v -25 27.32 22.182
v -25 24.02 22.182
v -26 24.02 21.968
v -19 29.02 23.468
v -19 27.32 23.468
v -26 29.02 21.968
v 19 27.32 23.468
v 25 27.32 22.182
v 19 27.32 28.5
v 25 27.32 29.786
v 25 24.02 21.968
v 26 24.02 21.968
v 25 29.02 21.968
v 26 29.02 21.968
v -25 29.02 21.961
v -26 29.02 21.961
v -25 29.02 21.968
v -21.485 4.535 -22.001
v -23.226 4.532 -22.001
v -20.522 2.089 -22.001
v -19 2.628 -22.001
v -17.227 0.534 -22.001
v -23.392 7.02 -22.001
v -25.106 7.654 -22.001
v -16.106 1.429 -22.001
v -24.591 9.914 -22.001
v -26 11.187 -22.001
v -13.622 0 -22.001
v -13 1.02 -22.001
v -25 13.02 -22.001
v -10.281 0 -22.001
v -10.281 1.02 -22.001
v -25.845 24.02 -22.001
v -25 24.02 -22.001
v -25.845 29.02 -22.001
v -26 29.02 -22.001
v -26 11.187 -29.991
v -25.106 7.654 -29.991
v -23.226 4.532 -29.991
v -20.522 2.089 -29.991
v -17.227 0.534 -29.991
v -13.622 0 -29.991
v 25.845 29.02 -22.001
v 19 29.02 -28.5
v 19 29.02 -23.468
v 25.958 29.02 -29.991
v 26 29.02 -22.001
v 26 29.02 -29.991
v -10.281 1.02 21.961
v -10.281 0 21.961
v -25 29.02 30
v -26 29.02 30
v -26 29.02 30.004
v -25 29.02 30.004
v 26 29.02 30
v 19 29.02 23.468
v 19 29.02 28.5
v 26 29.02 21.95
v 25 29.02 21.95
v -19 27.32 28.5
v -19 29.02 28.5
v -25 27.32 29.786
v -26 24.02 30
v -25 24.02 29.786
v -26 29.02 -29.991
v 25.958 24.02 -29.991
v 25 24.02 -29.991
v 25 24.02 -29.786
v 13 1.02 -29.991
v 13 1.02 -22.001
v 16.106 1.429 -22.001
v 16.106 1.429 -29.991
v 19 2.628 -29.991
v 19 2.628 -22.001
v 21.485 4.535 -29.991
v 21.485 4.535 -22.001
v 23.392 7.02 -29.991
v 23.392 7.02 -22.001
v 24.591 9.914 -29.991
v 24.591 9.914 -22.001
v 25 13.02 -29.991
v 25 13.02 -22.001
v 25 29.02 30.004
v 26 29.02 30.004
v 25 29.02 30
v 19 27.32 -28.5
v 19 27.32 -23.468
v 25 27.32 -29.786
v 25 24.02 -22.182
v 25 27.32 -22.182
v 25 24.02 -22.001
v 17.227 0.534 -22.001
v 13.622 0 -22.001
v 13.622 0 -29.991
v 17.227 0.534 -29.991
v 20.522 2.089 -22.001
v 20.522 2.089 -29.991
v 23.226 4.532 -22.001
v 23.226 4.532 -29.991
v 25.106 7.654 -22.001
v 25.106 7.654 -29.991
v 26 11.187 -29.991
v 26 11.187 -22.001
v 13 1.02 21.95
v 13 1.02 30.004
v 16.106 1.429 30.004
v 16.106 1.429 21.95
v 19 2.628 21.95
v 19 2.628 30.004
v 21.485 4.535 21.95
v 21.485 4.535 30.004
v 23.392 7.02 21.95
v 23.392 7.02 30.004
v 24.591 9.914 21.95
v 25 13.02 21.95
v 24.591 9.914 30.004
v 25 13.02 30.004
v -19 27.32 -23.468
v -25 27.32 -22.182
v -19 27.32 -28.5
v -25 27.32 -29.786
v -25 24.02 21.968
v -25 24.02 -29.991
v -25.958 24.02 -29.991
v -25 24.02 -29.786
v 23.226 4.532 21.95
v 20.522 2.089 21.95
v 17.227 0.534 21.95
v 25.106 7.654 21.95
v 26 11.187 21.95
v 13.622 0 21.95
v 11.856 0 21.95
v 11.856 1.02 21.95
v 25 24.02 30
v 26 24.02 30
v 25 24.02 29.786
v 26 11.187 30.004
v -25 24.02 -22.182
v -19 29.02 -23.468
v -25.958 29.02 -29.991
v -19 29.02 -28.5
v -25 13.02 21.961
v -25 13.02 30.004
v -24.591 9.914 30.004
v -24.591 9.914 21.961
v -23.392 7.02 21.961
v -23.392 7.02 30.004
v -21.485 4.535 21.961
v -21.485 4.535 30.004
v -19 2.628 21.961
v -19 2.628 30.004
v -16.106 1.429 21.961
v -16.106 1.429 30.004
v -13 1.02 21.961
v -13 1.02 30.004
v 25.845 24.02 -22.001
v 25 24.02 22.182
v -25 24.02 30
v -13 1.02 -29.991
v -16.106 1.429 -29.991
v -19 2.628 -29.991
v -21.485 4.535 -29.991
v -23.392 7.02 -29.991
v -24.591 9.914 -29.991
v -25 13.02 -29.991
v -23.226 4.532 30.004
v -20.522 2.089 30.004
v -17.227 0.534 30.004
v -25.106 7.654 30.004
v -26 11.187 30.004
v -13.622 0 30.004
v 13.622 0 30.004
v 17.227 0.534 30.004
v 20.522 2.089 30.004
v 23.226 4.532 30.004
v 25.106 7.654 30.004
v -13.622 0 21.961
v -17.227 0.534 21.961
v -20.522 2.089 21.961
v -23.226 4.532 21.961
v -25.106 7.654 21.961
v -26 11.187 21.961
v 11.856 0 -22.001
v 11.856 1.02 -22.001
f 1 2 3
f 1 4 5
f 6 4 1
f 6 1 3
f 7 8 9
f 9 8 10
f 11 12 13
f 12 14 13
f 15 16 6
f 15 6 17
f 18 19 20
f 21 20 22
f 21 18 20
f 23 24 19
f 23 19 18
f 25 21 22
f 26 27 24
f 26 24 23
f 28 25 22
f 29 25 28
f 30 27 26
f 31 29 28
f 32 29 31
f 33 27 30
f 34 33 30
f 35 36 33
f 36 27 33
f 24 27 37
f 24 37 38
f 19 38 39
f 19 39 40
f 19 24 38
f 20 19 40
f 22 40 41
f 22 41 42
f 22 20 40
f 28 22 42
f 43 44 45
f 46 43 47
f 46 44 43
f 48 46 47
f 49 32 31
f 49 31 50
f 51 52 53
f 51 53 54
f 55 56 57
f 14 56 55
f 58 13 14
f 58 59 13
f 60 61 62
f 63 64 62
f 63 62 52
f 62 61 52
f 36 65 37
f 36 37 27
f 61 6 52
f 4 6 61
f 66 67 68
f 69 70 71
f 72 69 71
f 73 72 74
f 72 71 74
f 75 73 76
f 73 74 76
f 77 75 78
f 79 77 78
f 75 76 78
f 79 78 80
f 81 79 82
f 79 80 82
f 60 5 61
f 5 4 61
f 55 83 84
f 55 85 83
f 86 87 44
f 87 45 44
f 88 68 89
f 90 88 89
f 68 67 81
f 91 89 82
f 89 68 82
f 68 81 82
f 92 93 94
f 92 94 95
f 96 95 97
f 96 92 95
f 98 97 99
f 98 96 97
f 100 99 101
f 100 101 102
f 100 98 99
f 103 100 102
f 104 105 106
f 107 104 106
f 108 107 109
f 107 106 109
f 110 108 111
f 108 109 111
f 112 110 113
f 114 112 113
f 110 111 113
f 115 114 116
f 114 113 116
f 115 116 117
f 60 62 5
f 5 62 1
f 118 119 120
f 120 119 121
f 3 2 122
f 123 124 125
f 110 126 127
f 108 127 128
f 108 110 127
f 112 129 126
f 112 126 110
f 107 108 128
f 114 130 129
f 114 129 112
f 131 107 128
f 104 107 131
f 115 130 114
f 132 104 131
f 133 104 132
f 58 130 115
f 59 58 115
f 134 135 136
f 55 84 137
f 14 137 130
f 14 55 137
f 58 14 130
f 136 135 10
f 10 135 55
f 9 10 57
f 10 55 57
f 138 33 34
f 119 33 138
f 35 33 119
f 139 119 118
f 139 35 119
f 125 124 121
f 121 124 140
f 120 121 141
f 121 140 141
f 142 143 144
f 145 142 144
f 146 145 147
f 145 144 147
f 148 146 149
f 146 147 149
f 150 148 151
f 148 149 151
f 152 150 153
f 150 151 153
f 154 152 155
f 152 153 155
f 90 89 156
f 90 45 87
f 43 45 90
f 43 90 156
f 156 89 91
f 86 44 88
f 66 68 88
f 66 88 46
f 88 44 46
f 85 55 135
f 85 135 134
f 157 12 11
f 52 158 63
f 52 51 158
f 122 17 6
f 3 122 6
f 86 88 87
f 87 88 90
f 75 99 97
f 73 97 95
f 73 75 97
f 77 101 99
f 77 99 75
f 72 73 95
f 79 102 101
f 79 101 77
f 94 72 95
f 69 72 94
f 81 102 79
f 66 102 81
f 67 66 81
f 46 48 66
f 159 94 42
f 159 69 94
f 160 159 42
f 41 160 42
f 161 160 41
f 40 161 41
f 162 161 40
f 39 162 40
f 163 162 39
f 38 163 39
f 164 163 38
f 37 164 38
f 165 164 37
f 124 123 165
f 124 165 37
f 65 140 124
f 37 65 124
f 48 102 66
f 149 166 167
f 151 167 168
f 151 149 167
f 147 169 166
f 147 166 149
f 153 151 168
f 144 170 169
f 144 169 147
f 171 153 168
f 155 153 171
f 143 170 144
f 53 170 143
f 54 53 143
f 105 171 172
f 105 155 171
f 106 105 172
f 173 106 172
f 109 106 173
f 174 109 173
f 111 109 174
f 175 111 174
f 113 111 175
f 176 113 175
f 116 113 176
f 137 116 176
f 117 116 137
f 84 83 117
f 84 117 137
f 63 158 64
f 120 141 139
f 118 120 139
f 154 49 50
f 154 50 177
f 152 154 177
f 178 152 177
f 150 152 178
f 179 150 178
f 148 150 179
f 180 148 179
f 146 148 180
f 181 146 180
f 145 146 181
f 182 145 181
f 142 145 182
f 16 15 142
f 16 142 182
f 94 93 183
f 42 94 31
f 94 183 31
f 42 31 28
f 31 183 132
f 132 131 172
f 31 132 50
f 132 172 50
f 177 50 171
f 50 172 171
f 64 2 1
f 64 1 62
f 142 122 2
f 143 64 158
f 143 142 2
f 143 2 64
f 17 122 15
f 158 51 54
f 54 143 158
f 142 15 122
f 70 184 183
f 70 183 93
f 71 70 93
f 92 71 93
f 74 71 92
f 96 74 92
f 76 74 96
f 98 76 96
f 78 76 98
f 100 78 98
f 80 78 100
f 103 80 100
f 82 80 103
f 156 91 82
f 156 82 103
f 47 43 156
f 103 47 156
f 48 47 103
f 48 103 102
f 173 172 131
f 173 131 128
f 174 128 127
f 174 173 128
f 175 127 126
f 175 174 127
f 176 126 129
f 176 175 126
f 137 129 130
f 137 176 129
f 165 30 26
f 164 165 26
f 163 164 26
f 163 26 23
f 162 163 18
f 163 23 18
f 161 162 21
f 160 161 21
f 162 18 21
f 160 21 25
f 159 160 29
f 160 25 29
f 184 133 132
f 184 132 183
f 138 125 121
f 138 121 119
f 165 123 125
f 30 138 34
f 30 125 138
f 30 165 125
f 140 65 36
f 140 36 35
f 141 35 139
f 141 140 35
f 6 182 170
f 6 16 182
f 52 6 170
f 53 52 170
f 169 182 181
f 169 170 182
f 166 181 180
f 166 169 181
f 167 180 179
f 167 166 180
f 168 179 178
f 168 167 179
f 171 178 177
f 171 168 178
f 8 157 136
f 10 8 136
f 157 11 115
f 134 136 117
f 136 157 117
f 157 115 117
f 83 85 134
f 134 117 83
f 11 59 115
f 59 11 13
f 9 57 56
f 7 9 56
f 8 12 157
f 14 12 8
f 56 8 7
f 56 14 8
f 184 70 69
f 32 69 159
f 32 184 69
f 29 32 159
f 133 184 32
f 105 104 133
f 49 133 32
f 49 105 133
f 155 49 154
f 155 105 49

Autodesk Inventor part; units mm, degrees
ref_plane "YZ Plane" through (0, 0, 0) normal (1, 0, 0) x (0, 1, 0)
ref_plane "XZ Plane" through (0, 0, 0) normal (0, 1, 0) x (-1, 0, 0)
ref_plane "XY Plane" through (0, 0, 0) normal (0, 0, 1) x (1, 0, 0)
sketch "Sketch1" plane through (0, 0, 0) normal (0, 1, 0) x (-1, 0, 0)
  line L0 (-26, -31) -> (26, -31)
  line L1 (26, -31) -> (26, 31)
  line L2 (26, 31) -> (-26, 31)
  line L3 (-26, 31) -> (-26, -31)
  line L4 (-26, -31) -> (26, 31) construction
  line L5 (26, -31) -> (-26, 31) construction
  point P0 (0, 0)
  dimension "d0" = 52
  dimension "d2" = 62
extrude "Extrusion1" add sketch "Sketch1" along normal blind 1.02
sketch "Sketch2" plane through (0, 1.02, 0) normal (0, 1, 0) x (1, 0, 0)
  line L0 (26, 31) -> (-26, 31) projected
  line L1 (-26, 31) -> (-26, -31) projected
  line L2 (-26, -31) -> (26, -31) projected
  line L3 (-26, 31) -> (-25, 31)
  line L4 (-25, 31) -> (-25, -31)
  line L5 (-26, -31) -> (-25, -31)
  line L6 (-26, -31) -> (-26, 31)
  line L7 (0, 46.5401) -> (0, -49.8176) construction
  line L8 (26, 31) -> (26, -31)
  line L9 (26, 31) -> (25, 31)
  line L10 (25, 31) -> (25, -31)
  line L11 (26, -31) -> (25, -31)
  line L12 (26, -31) -> (26, 31)
  point P0 (0, 0)
  dimension "d5" = 1
extrude "Extrusion2" add sketch "Sketch2" along normal blind 28 contours L8 L2 L10 L0 | L4 L2 L1 L0
fillet "Fillet1" radius 12 1 edges at (-25, 1.02, 0)
mirror "Mirror1" about plane through (0, 0, 0) normal (1, 0, 0) of "Fillet1"
sketch "Sketch3" plane through (-26, 0, -31) normal (-1, 0, 0) x (0, 0, 1)
  line L0 (0, 0) -> (62, 0) projected
  line L1 (62, 29.02) -> (61, 29.02) construction
  line L2 (61, 29.02) -> (61, 27.32)
  line L3 (61, 27.32) -> (53, 27.32)
  line L4 (53, 27.32) -> (53, 29.02)
  line L5 (61, 29.02) -> (53, 29.02)
  line L6 (53, 29.02) -> (61, 29.02)
  point P0 (31, 0)
  dimension "d9" = 1
  dimension "d10" = 1.7
  dimension "d11" = 8
extrude "Extrusion3" add sketch "Sketch3" against normal blind 7
mirror "Mirror3" about plane through (0, 0, 0) normal (0, 0, 1) of "Extrusion3"
mirror "Mirror4" about plane through (0, 0, 0) normal (1, 0, 0) of "Extrusion3", "Mirror3"
sketch "Sketch6" plane through (0, 29.02, 0) normal (0, 1, 0) x (1, 0, 0)
  line L0 (-30.2809, -30.0039) -> (31.8564, -30.0039)
  line L1 (31.8564, -30.0039) -> (31.8564, -41.1164)
  line L2 (31.8564, -41.1164) -> (-30.2809, -41.1164)
  line L3 (-30.2809, -41.1164) -> (-30.2809, -30.0039)
  line L4 (-30.2809, 39.7218) -> (31.1002, 39.7218)
  line L5 (31.1002, 39.7218) -> (31.1002, 29.9909)
  line L6 (31.1002, 29.9909) -> (-30.2809, 29.9909)
  line L7 (-30.2809, 29.9909) -> (-30.2809, 39.7218)
  line L8 (-30.2809, 22.0008) -> (-10.2809, 22.0008)
  line L9 (-10.2809, 22.0008) -> (-10.2809, -21.9612)
  line L10 (-10.2809, -21.9612) -> (-30.2809, -21.9612)
  line L11 (-30.2809, -21.9612) -> (-30.2809, 22.0008)
  line L12 (31.8564, -21.9503) -> (11.8564, -21.9503)
  line L13 (11.8564, -21.9503) -> (11.8564, 22.0008)
  line L14 (11.8564, 22.0008) -> (31.8564, 22.0008)
  line L15 (31.8564, 22.0008) -> (31.8564, -21.9503)
  point P0 (0, 0)
  dimension "d26" = 20
  dimension "d27" = 20
extrude "Extrusion6" cut sketch "Sketch6" against normal through all
sketch "Sketch7" plane through (0, 29.02, 0) normal (0, 1, 0) x (1, 0, 0)
  line L0 (19, 22.0008) -> (19, 30) projected
  line L1 (26, 22.0008) -> (26, 29.9909) projected
  line L2 (19, 30) -> (19, 28.5)
  line L3 (19, 28.5) -> (26, 30)
  line L4 (19, 30) -> (26, 30)
  line L5 (19, 30) -> (19, 22.0008) construction
  line L6 (18.3, 25.9838) -> (30.5903, 25.9838) construction
  line L7 (19, 29.9668) -> (19, 21.9676)
  line L8 (26, 29.9668) -> (26, 21.9767)
  line L9 (19, 21.9676) -> (19, 23.4676)
  line L10 (19, 23.4676) -> (26, 21.9676)
  line L11 (19, 21.9676) -> (26, 21.9676)
  line L12 (19, 21.9676) -> (19, 29.9668) construction
  point P0 (0, 0)
  dimension "d30" = 1.5
extrude "Extrusion7" cut sketch "Sketch7" against normal blind 5
mirror "Mirror6" about plane through (0, 0, 0) normal (1, 0, 0) of "Extrusion7"
mirror "Mirror7" about plane through (0, 0, 0) normal (0, 0, 1) of "Extrusion7", "Mirror6"
sketch "Sketch8" plane through (-26, 0, 30.0039) normal (0, 0, 1) x (1, 0, 0)
  line L0 (0, 0) -> (0, 29.02) projected
  line L1 (52, 0) -> (0, 0) projected
  line L2 (51, 29.02) -> (52, 29.02) projected
  arc A0 (0, 13.6957) -> (12.3777, 0) centre (12.3777, 12.4411) ccw
  line L3 (0, 11.1866) -> (0, 0)
  arc A1 (1, 13.02) -> (13, 1.02) centre (13, 13.02) ccw projected
  line L4 (52, 29.02) -> (52, 0) projected
  line L5 (26, 0) -> (26, 62.522) construction
  line L6 (52, 0) -> (52, 29.02)
  line L7 (0, 0) -> (52, 0)
  arc A2 (39.6223, 0) -> (52, 13.6957) centre (39.6223, 12.4411) ccw
  line L8 (52, 11.1866) -> (52, 0)
  arc A3 (39, 1.02) -> (51, 13.02) centre (39, 13.02) ccw
  dimension "d35" = 0.5788
extrude "Extrusion8" cut sketch "Sketch8" against normal through all contours A2 L4 L1 | L0 A0 L1
properties part number "tapa"
